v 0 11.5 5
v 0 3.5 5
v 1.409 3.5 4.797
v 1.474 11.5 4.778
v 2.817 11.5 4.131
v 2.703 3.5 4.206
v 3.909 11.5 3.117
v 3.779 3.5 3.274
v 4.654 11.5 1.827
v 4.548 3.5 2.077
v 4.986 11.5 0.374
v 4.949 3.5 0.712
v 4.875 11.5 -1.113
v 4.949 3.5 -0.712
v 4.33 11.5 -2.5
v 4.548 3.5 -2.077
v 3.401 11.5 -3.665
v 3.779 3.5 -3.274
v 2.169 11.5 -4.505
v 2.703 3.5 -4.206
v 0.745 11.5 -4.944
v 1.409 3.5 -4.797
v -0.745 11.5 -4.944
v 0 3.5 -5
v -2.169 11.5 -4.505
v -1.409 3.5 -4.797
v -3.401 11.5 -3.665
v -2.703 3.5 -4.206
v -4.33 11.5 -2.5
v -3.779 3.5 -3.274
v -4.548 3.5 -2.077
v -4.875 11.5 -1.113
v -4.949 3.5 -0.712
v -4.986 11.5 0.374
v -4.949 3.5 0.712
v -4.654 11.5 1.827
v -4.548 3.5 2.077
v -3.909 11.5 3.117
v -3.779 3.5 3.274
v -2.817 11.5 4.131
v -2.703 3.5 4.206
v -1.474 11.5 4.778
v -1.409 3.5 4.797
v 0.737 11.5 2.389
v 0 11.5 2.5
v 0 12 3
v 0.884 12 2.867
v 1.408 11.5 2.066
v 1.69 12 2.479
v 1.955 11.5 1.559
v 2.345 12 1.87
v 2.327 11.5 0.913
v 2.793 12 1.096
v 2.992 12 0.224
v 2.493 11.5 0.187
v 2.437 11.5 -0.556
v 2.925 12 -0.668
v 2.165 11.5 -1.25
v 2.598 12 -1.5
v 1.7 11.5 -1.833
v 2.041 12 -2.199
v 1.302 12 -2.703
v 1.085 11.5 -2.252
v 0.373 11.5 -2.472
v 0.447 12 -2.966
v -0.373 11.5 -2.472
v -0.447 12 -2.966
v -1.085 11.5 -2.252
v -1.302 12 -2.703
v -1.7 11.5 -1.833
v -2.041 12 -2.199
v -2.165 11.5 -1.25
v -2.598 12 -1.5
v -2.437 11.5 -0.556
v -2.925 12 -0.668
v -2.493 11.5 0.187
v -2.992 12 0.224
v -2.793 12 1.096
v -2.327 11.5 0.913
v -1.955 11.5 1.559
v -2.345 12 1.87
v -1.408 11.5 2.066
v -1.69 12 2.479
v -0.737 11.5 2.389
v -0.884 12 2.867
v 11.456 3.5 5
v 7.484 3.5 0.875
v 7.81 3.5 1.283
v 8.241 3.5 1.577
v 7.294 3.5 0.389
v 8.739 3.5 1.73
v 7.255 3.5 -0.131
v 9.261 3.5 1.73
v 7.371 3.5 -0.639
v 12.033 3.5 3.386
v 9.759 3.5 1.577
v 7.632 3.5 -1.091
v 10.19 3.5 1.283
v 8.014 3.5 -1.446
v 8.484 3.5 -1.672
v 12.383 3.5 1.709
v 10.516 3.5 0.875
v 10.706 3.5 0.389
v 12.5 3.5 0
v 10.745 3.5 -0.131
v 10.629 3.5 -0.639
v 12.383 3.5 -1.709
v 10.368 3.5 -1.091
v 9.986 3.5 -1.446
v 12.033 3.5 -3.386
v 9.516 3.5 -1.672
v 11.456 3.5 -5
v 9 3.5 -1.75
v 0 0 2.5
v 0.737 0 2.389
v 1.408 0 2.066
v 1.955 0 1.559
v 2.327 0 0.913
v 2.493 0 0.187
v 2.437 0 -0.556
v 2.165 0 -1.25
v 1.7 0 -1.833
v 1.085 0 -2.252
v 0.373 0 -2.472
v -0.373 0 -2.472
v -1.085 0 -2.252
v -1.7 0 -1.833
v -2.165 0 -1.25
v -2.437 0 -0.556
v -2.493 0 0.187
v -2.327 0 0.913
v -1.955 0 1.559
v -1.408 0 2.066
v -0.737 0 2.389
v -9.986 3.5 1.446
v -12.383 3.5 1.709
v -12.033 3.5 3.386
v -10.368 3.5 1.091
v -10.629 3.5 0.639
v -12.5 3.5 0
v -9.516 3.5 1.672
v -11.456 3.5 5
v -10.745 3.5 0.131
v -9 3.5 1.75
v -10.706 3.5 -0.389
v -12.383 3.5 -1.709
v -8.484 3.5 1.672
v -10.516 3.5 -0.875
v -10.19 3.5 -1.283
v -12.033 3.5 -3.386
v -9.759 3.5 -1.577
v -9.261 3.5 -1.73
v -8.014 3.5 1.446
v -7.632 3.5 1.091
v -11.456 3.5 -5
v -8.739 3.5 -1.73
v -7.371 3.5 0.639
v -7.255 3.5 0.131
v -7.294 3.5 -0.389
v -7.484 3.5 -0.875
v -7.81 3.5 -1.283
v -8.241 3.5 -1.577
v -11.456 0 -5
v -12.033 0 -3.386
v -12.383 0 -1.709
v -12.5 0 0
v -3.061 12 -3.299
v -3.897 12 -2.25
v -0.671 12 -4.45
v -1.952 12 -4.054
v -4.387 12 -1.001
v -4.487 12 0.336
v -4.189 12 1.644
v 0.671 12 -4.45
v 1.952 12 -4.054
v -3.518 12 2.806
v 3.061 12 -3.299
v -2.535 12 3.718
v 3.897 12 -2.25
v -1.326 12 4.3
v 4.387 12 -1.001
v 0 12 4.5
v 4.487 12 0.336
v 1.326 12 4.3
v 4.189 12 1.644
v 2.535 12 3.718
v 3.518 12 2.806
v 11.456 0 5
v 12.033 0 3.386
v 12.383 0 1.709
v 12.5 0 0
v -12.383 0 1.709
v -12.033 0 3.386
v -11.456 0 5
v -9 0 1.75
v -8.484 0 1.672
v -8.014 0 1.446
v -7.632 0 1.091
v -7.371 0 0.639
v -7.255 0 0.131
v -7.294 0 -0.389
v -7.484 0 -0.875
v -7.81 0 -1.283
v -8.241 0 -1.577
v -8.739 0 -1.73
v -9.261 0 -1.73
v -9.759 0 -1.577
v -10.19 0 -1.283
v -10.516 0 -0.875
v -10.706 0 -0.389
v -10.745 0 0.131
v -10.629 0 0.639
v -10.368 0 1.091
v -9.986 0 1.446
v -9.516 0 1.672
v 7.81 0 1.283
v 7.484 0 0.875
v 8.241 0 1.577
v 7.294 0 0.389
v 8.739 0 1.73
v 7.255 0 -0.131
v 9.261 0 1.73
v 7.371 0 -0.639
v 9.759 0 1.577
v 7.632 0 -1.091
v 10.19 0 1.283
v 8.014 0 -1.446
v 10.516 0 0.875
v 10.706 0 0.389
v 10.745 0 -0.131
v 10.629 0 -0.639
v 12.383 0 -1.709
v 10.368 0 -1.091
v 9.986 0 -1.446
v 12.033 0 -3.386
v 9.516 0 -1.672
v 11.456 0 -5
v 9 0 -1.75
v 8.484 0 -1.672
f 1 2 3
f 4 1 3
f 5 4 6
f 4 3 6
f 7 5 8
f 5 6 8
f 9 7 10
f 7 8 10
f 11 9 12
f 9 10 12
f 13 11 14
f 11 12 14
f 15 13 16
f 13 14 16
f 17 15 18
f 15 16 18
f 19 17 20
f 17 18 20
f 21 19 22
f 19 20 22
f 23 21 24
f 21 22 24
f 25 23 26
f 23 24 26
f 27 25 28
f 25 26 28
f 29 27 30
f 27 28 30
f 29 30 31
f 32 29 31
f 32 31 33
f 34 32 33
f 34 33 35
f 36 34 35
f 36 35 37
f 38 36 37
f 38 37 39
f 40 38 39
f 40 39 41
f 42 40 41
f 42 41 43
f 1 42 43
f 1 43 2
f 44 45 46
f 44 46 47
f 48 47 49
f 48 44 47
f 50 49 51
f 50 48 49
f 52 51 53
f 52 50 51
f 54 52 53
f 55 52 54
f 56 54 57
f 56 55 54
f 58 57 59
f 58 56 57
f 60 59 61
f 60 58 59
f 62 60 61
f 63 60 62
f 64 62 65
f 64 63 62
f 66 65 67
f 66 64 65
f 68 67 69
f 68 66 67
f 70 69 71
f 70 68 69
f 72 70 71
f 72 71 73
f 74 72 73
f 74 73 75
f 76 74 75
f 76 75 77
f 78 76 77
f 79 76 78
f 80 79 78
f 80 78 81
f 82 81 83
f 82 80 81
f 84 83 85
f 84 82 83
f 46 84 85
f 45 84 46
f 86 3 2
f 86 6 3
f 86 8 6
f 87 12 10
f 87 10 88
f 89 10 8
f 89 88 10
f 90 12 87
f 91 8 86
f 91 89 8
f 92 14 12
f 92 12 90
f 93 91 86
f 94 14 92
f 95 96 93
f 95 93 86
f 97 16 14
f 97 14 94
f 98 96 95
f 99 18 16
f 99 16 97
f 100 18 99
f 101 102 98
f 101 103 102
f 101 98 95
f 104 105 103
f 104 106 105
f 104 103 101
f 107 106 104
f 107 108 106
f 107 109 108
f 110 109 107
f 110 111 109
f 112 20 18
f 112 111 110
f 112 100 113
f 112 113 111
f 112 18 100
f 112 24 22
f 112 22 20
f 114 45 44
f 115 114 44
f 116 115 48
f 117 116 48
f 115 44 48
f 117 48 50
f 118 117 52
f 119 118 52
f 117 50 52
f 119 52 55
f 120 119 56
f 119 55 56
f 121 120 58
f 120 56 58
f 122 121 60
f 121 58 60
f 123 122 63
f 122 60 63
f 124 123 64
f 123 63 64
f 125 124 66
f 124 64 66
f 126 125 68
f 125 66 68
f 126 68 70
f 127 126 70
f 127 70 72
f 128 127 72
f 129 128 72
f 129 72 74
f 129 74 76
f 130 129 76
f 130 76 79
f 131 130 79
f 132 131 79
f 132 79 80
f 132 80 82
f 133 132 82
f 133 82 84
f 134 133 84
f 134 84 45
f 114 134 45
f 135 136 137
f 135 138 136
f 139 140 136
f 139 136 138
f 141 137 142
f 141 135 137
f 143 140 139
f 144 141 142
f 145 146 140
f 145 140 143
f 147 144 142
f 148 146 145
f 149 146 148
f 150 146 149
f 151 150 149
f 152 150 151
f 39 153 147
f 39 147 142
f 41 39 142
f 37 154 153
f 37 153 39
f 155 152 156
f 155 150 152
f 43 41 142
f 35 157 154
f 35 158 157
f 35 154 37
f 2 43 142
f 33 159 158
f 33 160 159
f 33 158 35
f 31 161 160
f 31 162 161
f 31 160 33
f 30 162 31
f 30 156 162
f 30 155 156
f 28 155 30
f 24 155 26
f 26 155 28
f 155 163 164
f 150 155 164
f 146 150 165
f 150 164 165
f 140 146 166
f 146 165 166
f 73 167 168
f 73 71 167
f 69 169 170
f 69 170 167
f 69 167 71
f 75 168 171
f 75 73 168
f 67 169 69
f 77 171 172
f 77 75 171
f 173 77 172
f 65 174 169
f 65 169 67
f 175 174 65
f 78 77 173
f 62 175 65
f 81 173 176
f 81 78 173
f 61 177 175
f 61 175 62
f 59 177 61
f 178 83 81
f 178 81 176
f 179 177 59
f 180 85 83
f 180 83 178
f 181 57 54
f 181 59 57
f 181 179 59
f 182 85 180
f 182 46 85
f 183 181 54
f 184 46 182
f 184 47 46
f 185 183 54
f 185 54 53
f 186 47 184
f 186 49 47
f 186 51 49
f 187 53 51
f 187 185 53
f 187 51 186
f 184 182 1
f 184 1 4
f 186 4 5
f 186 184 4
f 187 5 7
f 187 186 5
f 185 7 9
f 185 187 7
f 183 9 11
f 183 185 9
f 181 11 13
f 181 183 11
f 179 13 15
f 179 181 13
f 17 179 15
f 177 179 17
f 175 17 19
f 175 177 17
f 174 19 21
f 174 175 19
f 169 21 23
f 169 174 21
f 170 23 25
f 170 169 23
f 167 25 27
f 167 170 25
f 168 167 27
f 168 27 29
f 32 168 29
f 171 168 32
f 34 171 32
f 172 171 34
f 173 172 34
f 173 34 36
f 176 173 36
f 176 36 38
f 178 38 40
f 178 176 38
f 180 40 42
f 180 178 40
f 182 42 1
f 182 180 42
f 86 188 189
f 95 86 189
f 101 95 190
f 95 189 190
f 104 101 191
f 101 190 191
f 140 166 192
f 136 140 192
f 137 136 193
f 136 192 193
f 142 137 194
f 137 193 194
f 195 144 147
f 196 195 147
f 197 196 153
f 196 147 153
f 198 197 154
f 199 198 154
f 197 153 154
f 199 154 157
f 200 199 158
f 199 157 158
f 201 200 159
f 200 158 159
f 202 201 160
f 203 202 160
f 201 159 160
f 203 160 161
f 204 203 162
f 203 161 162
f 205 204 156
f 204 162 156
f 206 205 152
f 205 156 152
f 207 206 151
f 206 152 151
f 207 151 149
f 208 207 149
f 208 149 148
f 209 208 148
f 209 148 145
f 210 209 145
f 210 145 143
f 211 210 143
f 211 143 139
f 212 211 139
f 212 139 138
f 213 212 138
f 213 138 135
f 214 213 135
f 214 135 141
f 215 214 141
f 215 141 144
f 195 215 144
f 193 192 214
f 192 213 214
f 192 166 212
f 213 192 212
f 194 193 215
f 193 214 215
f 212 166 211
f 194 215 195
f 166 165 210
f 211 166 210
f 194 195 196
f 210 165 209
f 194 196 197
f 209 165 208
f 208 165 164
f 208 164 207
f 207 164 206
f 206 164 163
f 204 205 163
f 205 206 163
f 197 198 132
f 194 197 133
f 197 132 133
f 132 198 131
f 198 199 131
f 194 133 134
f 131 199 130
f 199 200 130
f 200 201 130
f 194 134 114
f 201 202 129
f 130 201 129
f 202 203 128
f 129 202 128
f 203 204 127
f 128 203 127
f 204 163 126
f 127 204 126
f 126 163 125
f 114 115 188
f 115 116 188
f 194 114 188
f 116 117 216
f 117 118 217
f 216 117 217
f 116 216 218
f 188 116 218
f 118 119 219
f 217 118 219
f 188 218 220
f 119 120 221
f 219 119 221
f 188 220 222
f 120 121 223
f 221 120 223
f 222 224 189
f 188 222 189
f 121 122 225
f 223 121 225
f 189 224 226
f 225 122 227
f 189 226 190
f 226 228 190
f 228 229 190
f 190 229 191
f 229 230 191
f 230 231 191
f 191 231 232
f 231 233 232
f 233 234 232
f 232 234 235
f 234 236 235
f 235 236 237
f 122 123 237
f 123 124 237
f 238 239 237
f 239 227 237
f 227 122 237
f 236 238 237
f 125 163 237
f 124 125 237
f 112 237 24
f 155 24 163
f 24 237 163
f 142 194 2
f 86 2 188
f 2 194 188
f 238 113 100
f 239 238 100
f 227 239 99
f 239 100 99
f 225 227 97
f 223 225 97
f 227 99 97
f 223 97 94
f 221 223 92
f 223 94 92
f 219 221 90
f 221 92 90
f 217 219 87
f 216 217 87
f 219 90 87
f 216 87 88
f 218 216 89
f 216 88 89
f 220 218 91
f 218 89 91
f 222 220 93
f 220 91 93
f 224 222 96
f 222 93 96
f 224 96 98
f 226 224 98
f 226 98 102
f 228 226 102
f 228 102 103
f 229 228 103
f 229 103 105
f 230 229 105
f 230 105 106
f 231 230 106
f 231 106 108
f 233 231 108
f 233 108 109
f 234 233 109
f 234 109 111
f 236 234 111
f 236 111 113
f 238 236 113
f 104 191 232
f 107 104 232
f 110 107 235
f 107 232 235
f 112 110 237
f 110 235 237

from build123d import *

# Parameters (mm, degrees)
EXTRUDE_1_DEPTH     = 3.5
SKETCH_2_R          = 5
EXTRUDE_2_DEPTH     = 8.5
SKETCH_3_R          = 2.5
CUT_EXTRUDE_1_DEPTH = 19.034688797
SKETCH_4_R          = 1.75
CUT_EXTRUDE_2_DEPTH = 16.921683328
CHAMFER_1_SIZE      = 0.5


with BuildPart() as part:
    # 草图1 → 凸台-拉伸1 (new body)
    with BuildSketch(Plane(origin=(0, 0, 0), x_dir=(1, 0, 0), z_dir=(0, 1, 0))):
        with BuildLine():
            ThreePointArc((-11.456439237, 5), (-12.236328912, 2.553870546), (-12.5, 0))
            Line((-12.5, 0), (12.5, 0))
            ThreePointArc((12.5, 0), (12.236328912, 2.553870546), (11.456439237, 5))
            Line((11.456439237, 5), (-11.456439237, 5))
        make_face()
        with BuildLine():
            Line((12.5, 0), (-12.5, 0))
            ThreePointArc((-12.5, 0), (-12.236328912, -2.553870546), (-11.456439237, -5))
            Line((-11.456439237, -5), (11.456439237, -5))
            ThreePointArc((11.456439237, -5), (12.236328912, -2.553870546), (12.5, 0))
        make_face()
    extrude(amount=EXTRUDE_1_DEPTH)

    # 草图2 → 凸台-拉伸2 (add)
    with BuildSketch(Plane(origin=(0, 3.5, 0), x_dir=(1, 0, 0), z_dir=(0, 1, 0))):
        with Locations(Location((0, 0, 0), (0, 0, 270))):
            Circle(SKETCH_2_R)
    extrude(amount=EXTRUDE_2_DEPTH)

    # 草图3 → 切除-拉伸1 (cut, through all)
    with BuildSketch(Plane(origin=(0, 12, 0), x_dir=(1, 0, 0), z_dir=(0, 1, 0))):
        with Locations(Location((0, 0, 0), (0, 0, 270))):
            Circle(SKETCH_3_R)
    extrude(amount=-CUT_EXTRUDE_1_DEPTH, mode=Mode.SUBTRACT)

    # 草图4 → 切除-拉伸2 (cut, through all)
    with BuildSketch(Plane(origin=(0, 3.5, 0), x_dir=(1, 0, 0), z_dir=(0, 1, 0))):
        with Locations(Location((-9, 0, 0), (0, 0, 270))):
            Circle(SKETCH_4_R)
        with Locations(Location((9, 0, 0), (0, 0, 90))):
            Circle(SKETCH_4_R)
    extrude(amount=-CUT_EXTRUDE_2_DEPTH, mode=Mode.SUBTRACT)

    # 倒角1
    chamfer_1_edges = [part.edges().sort_by_distance(p)[0] for p in [
        (0, 12, -5),
        (0, 12, -2.5),
    ]]
    chamfer(chamfer_1_edges, length=CHAMFER_1_SIZE)


solid = part.part
